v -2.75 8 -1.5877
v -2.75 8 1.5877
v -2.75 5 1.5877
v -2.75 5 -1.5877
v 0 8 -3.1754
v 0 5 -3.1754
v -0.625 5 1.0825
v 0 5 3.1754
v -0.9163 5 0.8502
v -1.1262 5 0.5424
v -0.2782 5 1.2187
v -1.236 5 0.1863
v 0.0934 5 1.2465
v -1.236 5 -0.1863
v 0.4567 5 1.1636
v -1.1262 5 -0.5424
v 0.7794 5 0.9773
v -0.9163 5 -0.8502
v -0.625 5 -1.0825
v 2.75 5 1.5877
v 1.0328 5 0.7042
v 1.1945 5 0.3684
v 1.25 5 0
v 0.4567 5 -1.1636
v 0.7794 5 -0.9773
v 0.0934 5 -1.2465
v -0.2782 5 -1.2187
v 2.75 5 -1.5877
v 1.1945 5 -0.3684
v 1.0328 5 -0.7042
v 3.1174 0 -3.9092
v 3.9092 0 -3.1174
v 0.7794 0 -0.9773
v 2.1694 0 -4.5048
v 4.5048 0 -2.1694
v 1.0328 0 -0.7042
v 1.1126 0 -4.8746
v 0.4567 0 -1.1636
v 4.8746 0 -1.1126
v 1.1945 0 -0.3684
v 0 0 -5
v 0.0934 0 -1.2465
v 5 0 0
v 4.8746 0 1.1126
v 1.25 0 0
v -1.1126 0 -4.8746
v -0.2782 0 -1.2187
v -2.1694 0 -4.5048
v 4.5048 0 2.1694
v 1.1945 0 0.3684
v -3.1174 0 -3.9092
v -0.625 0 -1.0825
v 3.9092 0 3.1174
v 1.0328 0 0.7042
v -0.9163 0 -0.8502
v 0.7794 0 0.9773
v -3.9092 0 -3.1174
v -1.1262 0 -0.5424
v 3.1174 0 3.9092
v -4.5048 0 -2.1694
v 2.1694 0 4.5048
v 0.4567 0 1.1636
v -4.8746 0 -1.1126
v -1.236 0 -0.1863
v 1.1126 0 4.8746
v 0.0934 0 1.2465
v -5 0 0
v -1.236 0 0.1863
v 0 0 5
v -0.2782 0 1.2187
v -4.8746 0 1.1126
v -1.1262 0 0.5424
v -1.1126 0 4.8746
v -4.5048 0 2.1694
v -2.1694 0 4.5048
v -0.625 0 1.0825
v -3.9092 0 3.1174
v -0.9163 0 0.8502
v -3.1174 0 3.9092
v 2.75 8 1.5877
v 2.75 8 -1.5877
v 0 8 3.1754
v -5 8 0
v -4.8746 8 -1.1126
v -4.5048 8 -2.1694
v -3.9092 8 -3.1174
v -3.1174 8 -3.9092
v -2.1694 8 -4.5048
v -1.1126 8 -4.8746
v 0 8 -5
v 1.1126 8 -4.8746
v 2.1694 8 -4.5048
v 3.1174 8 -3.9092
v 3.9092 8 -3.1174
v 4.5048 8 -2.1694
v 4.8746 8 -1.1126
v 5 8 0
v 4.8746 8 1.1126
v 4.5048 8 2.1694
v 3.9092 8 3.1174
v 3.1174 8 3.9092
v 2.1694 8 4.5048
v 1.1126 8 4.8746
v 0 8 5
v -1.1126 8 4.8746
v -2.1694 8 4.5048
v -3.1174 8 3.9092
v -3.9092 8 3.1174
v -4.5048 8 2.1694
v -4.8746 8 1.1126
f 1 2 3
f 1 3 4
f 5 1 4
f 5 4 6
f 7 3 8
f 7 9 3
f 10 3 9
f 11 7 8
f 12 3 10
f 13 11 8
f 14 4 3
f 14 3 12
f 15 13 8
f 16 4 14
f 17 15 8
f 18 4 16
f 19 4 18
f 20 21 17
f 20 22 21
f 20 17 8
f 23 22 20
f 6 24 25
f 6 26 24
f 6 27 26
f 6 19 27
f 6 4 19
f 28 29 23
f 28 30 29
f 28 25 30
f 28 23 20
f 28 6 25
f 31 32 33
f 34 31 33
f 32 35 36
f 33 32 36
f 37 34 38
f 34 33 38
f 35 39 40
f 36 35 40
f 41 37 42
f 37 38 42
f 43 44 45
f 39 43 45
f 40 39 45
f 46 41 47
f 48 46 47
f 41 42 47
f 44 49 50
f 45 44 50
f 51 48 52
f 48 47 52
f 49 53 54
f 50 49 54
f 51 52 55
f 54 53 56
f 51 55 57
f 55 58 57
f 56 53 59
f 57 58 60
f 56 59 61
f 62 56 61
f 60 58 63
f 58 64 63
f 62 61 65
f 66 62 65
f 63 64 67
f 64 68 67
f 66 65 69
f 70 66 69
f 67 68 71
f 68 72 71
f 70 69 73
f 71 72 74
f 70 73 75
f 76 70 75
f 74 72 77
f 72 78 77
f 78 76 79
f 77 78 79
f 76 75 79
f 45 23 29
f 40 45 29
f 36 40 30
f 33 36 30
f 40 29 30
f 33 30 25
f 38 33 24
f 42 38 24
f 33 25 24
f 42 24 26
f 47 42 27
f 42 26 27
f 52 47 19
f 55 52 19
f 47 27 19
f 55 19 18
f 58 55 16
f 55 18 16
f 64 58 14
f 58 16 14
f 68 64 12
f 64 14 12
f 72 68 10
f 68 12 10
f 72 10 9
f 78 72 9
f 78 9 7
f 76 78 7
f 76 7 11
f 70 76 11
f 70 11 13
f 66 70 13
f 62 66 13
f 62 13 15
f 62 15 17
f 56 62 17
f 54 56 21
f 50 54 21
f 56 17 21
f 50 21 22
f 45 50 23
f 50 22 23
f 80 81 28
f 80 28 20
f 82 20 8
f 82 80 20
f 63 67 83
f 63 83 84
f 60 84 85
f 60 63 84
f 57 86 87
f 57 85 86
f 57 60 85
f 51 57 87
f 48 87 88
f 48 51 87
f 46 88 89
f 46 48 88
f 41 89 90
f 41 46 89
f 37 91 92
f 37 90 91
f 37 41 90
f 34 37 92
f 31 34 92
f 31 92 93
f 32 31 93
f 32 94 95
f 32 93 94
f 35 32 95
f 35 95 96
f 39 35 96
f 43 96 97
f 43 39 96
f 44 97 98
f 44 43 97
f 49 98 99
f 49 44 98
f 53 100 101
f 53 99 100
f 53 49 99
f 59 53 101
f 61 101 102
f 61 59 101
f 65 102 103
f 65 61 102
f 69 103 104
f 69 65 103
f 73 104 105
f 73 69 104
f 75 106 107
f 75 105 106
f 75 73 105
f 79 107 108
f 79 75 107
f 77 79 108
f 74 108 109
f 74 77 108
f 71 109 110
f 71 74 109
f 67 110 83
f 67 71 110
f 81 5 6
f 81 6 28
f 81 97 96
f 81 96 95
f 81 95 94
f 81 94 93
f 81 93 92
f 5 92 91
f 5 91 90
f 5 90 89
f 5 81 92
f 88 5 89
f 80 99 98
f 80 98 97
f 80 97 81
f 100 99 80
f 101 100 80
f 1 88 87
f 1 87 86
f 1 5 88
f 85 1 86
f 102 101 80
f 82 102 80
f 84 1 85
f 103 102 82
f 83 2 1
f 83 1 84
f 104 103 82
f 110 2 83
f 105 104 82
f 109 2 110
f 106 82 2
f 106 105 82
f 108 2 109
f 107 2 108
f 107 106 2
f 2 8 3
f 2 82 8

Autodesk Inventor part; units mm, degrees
ref_plane "YZ Plane" through (0, 0, 0) normal (1, 0, 0) x (0, 1, 0)
ref_plane "XZ Plane" through (0, 0, 0) normal (0, 1, 0) x (-1, 0, 0)
ref_plane "XY Plane" through (0, 0, 0) normal (0, 0, 1) x (1, 0, 0)
sketch "Szkic1" plane through (0, 0, 0) normal (0, 1, 0) x (-1, 0, 0)
  circle A0 centre (0, 0) radius 5
  dimension "d0" = 10
extrude "Wyciągnięcie proste1" add sketch "Szkic1" along normal blind 8
sketch "Szkic2" plane through (0, 8, 0) normal (0, 1, 0) x (1, 0, 0)
  line L0 (-2.75, -1.5877) -> (-2.75, 1.5877)
  line L1 (-2.75, 1.5877) -> (0, 3.1754)
  line L2 (0, 3.1754) -> (2.75, 1.5877)
  line L3 (2.75, 1.5877) -> (2.75, -1.5877)
  line L4 (2.75, -1.5877) -> (0, -3.1754)
  line L5 (0, -3.1754) -> (-2.75, -1.5877)
  line L6 (0, 7) -> (0, -7) projected
  point P0 (0, 0)
  point P1 (0, 0)
  dimension "d3" = 5.5
extrude "Wyciągnięcie proste2" cut sketch "Szkic2" against normal blind 3
sketch "Szkic3" plane through (0, 5, 0) normal (0, 1, 0) x (1, 0, 0)
  circle A0 centre (0, 0) radius 5 projected
  circle A1 centre (0, 0) radius 1.25
  dimension "d6" = 2.5
extrude "Wyciągnięcie proste3" cut sketch "Szkic3" against normal through all contours A1
properties part number "housing_legs"
